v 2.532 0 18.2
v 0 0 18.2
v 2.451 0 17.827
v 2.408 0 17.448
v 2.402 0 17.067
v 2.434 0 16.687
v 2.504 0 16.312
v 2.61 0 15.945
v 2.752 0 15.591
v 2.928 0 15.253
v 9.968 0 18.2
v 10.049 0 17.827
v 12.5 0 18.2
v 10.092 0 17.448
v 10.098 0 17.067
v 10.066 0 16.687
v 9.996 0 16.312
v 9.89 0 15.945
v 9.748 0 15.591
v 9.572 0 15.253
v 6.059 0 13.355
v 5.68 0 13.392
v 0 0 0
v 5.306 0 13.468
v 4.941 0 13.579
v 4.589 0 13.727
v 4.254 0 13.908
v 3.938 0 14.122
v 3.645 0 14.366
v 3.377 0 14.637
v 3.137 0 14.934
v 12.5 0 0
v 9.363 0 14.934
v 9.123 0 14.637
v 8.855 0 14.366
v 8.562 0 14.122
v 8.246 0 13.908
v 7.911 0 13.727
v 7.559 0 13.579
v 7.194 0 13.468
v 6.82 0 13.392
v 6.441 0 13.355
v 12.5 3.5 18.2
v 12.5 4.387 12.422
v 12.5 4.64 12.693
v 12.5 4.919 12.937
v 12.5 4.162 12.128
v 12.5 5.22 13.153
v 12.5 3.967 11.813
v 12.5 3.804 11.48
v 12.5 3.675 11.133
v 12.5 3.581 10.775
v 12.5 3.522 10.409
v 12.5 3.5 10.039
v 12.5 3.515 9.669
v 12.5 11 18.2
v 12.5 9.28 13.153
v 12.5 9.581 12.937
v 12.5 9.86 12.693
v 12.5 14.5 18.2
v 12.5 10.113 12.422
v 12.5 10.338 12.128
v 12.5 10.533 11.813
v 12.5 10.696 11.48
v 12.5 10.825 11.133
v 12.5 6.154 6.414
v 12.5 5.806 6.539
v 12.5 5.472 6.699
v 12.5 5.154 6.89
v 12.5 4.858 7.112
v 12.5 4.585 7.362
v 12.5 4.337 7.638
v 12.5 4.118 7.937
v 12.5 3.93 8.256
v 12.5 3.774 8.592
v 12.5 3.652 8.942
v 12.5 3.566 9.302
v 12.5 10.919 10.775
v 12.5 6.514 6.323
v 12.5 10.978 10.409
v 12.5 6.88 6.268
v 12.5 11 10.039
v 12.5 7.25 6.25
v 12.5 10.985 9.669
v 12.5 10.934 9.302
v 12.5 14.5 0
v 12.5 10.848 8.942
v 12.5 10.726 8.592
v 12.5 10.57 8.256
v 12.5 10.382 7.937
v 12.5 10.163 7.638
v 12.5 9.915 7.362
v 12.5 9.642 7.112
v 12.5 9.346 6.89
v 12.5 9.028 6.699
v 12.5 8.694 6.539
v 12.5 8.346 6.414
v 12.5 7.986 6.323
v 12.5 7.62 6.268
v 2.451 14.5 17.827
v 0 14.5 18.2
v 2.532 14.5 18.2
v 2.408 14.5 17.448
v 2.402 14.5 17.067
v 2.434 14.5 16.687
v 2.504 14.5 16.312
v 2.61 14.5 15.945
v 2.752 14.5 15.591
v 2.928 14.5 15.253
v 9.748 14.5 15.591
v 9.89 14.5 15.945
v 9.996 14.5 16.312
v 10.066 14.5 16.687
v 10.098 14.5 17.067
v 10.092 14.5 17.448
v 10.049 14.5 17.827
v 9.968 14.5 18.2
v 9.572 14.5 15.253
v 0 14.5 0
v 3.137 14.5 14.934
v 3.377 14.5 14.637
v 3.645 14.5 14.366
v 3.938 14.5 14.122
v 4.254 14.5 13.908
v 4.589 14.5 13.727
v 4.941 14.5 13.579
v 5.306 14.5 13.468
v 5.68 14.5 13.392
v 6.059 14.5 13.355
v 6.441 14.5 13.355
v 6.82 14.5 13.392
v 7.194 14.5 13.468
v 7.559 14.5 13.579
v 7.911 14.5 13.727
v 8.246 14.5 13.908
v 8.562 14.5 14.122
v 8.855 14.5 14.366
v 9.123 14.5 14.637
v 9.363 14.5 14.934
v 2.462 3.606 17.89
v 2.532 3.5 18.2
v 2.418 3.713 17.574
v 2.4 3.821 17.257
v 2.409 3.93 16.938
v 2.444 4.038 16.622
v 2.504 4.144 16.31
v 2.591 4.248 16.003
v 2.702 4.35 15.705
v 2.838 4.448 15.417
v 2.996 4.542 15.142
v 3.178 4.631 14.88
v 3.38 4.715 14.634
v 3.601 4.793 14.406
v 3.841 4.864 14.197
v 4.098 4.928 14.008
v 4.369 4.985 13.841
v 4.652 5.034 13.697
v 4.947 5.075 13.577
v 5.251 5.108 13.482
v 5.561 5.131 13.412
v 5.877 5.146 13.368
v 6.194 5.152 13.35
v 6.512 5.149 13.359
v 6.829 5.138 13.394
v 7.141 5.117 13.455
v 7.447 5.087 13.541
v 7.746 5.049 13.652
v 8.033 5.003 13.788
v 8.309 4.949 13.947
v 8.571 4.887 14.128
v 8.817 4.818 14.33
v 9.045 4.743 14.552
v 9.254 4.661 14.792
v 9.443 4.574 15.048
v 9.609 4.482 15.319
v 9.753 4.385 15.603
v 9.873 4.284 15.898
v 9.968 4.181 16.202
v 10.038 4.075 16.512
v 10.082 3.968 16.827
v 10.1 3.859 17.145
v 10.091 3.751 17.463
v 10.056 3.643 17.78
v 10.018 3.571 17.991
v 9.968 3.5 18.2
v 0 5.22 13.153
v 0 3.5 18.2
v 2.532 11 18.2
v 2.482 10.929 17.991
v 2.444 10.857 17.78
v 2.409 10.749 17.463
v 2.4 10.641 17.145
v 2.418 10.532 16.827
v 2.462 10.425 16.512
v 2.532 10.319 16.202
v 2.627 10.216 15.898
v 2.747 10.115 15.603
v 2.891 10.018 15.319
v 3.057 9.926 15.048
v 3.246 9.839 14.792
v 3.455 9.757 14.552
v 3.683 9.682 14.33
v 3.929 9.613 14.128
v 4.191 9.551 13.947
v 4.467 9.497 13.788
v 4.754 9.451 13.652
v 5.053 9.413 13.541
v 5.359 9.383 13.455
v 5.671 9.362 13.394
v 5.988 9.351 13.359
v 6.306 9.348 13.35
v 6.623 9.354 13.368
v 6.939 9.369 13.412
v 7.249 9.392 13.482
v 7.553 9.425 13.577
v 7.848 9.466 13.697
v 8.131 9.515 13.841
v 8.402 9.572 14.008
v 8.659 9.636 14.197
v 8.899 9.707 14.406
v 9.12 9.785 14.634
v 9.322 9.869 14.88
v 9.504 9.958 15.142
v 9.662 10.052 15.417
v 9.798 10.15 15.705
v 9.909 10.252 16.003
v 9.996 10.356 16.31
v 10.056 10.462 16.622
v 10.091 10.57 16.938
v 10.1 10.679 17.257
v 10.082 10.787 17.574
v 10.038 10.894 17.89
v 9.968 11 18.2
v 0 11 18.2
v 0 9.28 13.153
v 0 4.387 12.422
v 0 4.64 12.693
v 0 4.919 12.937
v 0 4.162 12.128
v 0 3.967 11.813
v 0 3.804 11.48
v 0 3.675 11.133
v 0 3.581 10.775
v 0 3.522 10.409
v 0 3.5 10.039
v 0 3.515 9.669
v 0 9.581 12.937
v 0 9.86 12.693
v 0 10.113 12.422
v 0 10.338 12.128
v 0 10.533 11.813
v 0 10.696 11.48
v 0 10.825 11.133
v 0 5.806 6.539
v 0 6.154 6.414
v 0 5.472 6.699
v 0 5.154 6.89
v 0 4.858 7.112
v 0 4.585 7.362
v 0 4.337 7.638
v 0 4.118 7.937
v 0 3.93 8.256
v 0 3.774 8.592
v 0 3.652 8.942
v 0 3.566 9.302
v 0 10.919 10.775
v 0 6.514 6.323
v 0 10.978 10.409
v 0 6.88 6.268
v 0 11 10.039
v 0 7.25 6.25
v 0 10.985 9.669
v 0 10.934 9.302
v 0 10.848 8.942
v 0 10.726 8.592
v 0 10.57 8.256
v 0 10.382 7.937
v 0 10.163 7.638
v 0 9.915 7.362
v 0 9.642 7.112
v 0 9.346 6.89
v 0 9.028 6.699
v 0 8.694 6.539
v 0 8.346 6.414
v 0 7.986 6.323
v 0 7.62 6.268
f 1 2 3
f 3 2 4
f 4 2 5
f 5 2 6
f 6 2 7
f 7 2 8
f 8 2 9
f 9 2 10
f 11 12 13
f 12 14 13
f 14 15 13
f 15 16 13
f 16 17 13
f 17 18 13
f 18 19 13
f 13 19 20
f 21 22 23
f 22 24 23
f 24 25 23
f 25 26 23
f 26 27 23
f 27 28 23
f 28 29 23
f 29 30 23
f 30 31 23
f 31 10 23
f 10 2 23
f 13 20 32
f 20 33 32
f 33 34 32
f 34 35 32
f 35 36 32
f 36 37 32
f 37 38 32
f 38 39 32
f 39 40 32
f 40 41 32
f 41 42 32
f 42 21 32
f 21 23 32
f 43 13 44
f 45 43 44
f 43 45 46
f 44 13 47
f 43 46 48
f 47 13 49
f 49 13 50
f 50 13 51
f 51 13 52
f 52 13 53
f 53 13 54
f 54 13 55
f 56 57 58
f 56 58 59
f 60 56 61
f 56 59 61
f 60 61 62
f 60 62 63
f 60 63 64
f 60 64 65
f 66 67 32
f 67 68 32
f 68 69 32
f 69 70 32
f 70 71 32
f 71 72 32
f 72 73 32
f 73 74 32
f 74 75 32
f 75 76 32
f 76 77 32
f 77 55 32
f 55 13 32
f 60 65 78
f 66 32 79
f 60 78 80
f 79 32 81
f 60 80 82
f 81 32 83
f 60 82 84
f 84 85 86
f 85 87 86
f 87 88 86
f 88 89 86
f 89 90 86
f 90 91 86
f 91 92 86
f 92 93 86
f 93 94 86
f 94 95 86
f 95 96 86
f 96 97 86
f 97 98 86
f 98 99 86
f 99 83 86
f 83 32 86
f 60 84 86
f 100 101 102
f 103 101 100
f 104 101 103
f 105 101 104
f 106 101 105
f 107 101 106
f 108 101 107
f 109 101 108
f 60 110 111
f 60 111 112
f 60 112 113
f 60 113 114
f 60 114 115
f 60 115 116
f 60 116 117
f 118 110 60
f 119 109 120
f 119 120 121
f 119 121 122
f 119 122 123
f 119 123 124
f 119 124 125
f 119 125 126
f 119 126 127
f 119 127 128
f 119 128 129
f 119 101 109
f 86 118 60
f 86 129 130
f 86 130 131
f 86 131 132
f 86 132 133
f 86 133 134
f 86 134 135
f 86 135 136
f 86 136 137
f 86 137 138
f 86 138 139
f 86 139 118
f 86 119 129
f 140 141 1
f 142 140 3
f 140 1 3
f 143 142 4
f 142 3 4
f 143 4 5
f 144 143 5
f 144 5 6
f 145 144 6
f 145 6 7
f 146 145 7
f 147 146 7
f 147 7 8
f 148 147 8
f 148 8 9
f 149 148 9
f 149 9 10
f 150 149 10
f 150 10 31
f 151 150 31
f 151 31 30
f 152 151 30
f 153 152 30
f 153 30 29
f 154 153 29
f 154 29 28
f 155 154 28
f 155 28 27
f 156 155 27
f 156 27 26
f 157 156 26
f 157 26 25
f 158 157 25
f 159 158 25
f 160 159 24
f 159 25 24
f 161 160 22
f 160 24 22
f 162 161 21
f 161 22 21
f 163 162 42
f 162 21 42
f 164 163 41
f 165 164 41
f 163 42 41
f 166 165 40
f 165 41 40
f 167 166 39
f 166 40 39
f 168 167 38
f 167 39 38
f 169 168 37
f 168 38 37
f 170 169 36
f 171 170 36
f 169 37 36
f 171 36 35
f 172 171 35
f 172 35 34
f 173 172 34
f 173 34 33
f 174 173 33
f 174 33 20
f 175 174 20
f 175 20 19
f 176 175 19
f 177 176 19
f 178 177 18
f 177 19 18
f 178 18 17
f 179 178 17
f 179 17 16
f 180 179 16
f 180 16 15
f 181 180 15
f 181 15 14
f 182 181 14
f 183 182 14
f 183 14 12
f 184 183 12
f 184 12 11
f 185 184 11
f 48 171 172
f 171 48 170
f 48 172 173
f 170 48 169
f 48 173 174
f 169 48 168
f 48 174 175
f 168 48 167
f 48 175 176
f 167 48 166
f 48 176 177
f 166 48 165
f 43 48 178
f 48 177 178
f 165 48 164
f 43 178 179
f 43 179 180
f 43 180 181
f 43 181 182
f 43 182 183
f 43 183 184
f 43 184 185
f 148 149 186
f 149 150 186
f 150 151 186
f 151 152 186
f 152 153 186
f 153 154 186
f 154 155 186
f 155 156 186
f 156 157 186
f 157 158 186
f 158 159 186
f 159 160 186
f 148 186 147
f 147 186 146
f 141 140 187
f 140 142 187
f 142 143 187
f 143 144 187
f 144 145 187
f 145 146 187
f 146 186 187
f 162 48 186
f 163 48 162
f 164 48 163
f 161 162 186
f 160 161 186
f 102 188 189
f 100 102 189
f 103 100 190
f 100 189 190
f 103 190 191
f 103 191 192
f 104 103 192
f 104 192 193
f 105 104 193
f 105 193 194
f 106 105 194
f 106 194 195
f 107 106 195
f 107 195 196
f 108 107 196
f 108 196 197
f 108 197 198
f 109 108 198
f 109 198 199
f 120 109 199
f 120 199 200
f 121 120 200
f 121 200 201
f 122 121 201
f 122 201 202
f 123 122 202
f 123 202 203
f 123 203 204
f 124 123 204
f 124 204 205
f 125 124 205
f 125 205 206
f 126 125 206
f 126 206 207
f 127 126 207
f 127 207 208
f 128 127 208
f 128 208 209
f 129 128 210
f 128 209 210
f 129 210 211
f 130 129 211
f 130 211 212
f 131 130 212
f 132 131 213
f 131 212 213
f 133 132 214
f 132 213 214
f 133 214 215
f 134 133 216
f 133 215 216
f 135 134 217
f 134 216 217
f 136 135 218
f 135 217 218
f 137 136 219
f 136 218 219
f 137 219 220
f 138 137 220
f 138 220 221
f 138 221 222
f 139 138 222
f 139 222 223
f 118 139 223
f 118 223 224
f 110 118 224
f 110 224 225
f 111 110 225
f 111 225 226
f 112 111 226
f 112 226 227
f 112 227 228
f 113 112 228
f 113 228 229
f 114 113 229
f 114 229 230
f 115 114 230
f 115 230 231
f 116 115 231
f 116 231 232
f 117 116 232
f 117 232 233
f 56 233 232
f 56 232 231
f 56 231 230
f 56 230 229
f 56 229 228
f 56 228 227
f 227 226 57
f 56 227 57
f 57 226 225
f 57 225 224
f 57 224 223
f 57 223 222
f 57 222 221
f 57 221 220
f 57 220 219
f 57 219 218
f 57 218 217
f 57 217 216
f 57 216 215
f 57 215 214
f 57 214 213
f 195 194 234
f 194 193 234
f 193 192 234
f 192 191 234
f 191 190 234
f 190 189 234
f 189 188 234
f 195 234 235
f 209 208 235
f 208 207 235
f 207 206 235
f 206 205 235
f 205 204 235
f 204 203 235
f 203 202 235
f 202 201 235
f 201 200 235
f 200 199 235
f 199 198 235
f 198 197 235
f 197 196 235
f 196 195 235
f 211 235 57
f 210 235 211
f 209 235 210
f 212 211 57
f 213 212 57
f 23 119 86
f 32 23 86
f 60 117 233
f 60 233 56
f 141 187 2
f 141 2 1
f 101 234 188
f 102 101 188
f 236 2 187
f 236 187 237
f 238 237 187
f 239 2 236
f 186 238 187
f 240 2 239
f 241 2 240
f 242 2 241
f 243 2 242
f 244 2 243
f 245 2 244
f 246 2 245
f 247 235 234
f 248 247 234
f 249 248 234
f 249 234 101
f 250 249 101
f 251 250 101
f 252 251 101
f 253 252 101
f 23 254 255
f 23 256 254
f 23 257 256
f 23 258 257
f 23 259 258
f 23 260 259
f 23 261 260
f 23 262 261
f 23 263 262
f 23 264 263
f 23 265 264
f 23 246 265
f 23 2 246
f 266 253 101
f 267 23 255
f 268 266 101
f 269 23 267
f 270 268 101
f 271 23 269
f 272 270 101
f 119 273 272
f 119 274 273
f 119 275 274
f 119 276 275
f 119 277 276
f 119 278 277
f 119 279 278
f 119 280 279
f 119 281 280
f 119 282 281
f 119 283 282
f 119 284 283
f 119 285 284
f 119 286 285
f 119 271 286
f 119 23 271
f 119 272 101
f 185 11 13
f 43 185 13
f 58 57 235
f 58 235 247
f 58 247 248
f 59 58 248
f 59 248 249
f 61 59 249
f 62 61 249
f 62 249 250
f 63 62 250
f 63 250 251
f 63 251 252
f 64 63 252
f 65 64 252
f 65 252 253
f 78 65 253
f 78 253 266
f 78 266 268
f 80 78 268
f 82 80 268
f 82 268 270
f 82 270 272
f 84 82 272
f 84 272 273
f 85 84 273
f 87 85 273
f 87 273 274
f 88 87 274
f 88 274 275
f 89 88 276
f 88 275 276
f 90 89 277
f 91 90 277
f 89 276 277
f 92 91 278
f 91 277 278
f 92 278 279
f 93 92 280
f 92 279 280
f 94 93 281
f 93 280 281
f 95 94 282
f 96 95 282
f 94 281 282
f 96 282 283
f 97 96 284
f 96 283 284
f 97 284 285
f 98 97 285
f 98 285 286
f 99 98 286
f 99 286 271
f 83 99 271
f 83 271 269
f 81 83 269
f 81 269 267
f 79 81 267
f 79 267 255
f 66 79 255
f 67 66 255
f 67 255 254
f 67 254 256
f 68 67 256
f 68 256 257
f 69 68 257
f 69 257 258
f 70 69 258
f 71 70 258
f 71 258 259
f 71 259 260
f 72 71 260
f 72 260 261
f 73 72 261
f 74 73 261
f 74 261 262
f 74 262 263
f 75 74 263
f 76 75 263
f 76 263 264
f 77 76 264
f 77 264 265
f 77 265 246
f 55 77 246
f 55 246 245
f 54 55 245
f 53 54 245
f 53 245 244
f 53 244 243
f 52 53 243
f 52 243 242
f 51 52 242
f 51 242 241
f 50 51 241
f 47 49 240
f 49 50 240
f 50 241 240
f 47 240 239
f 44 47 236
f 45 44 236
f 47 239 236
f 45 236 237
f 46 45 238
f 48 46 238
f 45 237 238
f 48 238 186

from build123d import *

# Parameters (mm, degrees)
F0_W     = 12.5
F0_H     = 14.5
F1_DEPTH = 18.2
F2_R     = 3.85
F3_DEPTH = 25
F5_DEPTH = 25


with BuildPart() as f1:
    # F0 (on Top) → F1 (new body)
    with BuildSketch(Plane.XY):
        with Locations((6.25, 7.25)):
            Rectangle(F0_W, F0_H)
    extrude(amount=F1_DEPTH)

    # F2 (on face) → F3 (cut)
    with BuildSketch(Plane.XZ):
        with Locations((6.25, 17.2)):
            Circle(F2_R)
    extrude(amount=-F3_DEPTH, mode=Mode.SUBTRACT)

    # F4 (on face) → F5 (cut)
    with BuildSketch(Plane(origin=(0, 0, 0), x_dir=(0, -1, 0), z_dir=(-1, 0, 0))):
        with BuildLine():
            Line((-11, 18.2), (-9.280318, 13.152826))
            ThreePointArc((-9.280318, 13.152826), (-7.25, 6.25), (-5.219682, 13.152826))
            Line((-5.219682, 13.152826), (-3.5, 18.2))
            Line((-3.5, 18.2), (-11, 18.2))
        make_face()
    extrude(amount=-F5_DEPTH, mode=Mode.SUBTRACT)


solid = f1.part
